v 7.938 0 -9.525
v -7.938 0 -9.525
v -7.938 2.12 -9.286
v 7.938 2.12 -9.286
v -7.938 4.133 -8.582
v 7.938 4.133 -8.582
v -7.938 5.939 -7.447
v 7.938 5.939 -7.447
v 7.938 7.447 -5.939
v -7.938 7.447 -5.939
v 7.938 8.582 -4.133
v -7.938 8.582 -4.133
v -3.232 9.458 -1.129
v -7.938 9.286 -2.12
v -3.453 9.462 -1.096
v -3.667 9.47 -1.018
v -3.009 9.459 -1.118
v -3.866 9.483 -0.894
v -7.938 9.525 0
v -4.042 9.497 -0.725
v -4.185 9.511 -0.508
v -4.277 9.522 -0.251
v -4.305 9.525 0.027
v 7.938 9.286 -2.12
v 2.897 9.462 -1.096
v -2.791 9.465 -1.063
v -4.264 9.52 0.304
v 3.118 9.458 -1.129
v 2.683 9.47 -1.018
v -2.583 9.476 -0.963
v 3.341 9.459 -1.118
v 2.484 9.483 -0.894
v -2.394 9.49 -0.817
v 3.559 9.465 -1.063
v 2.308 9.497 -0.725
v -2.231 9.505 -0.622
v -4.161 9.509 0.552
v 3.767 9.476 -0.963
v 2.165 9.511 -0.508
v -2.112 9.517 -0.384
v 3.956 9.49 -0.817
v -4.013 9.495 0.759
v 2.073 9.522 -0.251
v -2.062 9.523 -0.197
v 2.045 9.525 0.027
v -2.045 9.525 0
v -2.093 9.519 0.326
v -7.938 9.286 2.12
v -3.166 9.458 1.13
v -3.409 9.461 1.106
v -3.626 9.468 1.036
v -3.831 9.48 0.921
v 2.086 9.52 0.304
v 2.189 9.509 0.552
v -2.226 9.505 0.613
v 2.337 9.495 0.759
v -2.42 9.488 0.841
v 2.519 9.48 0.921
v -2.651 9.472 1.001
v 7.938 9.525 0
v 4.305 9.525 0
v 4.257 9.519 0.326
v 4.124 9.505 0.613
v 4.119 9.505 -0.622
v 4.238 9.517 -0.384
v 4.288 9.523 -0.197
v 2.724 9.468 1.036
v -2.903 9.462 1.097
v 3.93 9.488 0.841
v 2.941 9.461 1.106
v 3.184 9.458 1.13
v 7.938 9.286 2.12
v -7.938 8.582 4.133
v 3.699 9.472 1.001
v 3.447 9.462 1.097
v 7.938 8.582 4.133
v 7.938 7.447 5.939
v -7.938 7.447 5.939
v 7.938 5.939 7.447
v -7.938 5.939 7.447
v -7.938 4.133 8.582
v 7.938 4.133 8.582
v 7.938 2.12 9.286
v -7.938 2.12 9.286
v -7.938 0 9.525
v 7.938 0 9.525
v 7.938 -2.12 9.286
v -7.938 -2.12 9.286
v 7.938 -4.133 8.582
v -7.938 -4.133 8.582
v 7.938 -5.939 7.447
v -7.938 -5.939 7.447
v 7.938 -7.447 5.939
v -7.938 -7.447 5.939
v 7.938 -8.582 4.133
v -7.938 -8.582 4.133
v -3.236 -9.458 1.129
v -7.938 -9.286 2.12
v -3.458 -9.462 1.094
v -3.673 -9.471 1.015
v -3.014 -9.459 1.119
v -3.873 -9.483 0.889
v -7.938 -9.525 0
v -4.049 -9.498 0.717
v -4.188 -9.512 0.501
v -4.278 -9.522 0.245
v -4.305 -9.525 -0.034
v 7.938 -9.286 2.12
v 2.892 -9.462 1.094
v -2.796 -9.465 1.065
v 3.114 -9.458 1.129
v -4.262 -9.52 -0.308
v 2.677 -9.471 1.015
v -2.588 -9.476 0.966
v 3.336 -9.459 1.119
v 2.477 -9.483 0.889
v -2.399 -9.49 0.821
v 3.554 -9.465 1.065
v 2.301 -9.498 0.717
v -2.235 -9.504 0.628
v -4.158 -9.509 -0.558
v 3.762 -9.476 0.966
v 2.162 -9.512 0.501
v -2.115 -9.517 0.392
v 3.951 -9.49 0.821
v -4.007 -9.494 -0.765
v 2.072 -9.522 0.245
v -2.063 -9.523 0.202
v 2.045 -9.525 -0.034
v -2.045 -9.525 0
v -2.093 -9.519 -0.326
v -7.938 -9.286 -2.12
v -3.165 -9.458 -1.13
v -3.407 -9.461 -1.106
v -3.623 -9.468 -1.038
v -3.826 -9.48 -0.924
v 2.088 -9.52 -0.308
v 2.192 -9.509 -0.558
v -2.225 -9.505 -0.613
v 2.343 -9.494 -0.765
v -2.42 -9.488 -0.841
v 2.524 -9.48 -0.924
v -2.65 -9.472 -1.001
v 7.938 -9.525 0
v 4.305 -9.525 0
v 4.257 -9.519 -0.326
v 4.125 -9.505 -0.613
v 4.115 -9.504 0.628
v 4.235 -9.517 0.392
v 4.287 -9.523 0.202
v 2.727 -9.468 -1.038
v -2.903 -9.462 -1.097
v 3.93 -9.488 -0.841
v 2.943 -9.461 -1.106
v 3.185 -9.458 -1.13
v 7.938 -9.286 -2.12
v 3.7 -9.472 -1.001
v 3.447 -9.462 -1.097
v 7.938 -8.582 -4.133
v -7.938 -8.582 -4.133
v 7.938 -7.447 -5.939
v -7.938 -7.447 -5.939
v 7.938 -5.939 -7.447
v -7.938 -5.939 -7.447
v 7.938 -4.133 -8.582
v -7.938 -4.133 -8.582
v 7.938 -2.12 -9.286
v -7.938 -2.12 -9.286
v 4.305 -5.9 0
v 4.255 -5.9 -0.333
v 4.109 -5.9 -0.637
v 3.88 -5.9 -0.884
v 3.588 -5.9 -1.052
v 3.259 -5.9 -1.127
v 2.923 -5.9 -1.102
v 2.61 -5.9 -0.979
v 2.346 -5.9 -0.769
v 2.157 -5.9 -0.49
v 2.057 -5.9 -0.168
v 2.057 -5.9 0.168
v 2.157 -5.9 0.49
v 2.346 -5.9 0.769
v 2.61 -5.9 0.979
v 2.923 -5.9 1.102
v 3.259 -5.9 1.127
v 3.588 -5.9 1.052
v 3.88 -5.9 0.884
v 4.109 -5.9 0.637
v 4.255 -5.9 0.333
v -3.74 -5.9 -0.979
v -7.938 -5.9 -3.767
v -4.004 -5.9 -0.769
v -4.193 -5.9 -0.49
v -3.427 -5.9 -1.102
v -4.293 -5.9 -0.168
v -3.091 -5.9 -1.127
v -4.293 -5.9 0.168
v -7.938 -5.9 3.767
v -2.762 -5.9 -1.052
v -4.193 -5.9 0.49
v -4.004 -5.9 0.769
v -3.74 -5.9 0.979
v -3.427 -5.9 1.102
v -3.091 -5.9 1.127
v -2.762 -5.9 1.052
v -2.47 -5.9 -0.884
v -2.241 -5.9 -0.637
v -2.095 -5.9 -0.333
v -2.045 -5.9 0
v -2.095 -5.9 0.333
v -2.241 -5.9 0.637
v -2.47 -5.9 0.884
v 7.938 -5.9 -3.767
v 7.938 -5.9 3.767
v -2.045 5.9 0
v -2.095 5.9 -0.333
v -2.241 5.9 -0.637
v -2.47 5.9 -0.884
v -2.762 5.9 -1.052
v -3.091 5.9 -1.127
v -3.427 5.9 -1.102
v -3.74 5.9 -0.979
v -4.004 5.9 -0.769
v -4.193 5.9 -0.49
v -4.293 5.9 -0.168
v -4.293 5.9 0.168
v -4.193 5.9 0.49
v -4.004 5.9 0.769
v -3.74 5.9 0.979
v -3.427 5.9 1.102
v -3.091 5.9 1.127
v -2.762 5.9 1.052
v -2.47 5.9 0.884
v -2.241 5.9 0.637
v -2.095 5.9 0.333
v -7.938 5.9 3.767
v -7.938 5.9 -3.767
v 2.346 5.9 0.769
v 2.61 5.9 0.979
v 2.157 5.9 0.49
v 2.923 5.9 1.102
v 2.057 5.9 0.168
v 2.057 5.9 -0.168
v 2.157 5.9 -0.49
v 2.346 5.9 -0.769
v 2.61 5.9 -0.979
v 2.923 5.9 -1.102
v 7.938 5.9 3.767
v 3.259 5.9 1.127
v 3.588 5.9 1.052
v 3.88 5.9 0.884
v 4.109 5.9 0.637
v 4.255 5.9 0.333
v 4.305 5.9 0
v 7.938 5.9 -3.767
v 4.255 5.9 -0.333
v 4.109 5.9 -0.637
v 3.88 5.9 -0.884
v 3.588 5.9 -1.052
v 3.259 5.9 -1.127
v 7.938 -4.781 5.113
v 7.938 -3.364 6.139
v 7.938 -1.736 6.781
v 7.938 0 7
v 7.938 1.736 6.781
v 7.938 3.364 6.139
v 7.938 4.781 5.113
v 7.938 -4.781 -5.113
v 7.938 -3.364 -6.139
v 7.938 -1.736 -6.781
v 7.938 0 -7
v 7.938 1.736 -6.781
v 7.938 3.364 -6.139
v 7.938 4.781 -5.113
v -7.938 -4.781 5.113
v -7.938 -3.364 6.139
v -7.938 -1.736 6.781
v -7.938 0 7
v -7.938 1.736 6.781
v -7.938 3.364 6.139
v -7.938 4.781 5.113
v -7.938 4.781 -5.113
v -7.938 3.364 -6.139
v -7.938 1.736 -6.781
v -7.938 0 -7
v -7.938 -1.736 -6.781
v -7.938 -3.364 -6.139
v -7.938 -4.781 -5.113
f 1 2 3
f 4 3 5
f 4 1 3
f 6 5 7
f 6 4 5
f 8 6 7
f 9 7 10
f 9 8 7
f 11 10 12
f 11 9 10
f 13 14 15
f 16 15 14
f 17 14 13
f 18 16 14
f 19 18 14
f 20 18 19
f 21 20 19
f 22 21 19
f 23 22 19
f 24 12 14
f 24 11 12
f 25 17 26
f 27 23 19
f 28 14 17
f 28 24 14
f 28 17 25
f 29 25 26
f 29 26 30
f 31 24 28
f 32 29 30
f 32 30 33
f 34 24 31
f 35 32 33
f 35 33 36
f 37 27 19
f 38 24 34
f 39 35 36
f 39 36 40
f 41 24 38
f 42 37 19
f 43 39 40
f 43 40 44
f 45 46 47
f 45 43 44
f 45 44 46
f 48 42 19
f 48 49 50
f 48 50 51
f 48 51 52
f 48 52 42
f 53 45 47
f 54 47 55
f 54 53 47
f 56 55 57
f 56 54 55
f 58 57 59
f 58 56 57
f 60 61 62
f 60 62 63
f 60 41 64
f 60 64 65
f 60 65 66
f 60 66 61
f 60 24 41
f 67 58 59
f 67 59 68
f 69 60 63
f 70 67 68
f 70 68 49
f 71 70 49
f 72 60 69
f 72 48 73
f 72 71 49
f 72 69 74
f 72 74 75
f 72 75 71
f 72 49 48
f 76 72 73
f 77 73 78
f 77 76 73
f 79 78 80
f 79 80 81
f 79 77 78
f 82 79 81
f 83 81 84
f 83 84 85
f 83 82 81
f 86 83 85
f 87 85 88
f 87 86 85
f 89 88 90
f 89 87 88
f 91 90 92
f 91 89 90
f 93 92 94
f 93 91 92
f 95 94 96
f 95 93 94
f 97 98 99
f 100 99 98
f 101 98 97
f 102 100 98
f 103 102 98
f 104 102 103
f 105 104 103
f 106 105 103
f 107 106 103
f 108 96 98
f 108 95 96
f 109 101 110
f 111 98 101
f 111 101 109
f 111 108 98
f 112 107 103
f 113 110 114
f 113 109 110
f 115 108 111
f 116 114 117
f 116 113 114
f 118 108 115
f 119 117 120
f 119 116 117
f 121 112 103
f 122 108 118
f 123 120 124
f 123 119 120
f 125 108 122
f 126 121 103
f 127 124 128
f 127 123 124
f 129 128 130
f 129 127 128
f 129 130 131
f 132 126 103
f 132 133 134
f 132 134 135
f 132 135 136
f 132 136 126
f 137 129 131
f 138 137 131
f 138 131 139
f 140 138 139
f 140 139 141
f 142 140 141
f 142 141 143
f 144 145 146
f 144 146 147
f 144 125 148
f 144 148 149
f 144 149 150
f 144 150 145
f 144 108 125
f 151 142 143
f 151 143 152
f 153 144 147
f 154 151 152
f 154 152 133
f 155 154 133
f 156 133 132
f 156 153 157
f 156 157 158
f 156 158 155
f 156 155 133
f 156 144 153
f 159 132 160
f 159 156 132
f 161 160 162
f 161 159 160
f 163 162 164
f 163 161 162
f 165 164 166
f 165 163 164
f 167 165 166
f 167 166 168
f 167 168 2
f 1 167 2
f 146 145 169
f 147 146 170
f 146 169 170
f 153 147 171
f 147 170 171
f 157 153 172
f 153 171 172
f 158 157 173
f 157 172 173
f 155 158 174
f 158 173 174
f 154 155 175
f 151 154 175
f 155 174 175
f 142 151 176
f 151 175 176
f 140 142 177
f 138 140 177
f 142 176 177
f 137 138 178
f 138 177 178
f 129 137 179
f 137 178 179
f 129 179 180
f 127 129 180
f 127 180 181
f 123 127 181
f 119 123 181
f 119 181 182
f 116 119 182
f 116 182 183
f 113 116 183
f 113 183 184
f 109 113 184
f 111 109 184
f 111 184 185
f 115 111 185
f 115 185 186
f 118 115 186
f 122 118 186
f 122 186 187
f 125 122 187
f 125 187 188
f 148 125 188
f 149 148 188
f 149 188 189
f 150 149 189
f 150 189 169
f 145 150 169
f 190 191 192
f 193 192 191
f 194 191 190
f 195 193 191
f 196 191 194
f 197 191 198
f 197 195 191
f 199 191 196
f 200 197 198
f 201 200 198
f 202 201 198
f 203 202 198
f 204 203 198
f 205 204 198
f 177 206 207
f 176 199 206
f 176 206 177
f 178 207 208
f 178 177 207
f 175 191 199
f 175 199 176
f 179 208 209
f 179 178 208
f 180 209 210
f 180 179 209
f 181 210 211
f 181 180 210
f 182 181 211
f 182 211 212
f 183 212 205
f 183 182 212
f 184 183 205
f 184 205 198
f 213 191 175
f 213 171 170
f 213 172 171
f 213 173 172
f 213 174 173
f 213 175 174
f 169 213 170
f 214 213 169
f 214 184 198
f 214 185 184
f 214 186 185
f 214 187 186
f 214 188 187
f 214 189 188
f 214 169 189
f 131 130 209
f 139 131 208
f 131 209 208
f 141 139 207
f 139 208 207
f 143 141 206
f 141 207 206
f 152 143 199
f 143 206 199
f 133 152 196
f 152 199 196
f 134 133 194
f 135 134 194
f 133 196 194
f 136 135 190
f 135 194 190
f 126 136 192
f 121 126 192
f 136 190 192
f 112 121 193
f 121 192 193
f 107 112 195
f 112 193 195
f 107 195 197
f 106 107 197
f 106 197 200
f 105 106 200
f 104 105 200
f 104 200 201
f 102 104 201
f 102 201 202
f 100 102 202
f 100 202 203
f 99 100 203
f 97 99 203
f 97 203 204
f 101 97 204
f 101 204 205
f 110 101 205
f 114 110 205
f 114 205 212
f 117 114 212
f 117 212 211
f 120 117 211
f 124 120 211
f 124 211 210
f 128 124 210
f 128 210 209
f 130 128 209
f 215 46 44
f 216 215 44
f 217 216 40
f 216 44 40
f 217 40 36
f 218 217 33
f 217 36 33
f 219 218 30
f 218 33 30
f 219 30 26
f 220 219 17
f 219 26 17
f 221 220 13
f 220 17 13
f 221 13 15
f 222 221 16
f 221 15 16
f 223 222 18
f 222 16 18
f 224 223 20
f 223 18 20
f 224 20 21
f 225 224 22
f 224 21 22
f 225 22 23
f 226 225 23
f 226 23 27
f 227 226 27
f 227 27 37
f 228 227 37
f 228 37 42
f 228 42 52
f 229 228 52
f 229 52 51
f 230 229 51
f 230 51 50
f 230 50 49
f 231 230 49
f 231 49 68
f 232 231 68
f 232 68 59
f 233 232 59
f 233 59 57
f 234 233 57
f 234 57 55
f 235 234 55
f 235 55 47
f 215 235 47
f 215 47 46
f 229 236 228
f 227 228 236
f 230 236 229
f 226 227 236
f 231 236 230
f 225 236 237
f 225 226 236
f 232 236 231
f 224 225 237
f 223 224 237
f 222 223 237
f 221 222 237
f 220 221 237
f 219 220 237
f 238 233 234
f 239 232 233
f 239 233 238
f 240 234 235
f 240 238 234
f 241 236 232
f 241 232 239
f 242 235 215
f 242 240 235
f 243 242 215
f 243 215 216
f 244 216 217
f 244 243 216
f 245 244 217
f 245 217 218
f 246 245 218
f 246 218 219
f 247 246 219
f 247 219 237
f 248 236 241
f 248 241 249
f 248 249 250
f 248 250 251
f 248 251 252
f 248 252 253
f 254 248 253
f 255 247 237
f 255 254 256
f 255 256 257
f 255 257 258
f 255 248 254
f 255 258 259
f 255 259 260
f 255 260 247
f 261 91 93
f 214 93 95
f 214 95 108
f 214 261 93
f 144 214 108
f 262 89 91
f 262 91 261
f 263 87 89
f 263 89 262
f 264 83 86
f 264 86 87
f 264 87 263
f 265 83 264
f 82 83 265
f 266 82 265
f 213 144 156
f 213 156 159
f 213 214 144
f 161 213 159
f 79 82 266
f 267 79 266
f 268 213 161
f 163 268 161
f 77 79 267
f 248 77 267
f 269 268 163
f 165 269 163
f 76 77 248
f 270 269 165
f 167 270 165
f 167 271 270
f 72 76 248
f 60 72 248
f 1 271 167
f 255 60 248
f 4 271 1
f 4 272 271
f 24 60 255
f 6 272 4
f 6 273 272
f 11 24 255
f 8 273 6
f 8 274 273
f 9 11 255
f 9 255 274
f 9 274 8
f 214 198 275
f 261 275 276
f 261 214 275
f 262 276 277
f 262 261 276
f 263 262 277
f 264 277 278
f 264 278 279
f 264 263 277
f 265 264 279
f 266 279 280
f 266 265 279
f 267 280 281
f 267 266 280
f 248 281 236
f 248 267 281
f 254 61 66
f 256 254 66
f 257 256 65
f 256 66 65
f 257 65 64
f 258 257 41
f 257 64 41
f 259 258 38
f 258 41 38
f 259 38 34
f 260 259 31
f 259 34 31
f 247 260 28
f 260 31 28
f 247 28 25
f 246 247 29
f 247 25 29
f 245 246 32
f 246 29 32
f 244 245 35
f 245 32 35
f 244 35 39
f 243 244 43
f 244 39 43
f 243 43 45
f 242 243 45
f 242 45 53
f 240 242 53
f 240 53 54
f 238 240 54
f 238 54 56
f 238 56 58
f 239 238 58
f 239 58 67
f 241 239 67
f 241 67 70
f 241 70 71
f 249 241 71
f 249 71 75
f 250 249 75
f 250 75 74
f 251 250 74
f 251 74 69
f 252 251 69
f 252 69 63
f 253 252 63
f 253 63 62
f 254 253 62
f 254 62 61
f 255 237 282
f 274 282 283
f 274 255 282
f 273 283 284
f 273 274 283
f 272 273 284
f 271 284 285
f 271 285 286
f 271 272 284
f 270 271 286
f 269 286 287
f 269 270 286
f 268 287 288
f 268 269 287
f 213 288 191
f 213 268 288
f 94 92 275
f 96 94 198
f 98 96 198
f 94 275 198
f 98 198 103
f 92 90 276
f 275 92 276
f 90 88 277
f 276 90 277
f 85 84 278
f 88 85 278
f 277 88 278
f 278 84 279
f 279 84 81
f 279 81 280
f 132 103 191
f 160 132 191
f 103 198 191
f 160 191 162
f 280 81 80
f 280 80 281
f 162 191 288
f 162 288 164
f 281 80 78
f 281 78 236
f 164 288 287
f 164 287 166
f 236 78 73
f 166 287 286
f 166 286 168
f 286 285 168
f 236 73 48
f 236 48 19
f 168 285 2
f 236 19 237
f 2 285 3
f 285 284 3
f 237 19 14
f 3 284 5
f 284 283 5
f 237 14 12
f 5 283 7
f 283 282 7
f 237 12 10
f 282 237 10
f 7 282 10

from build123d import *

# Parameters (mm, degrees)
SKETCH1_R               = 9.525
BOSS_EXTRUDE1_DEPTH     = 7.9375
SKETCH2_R               = 1.1303
CUT_EXTRUDE1_DEPTH      = 1
CUT_EXTRUDE1_DEPTH_BACK = 20.05


with BuildPart() as part:
    # Sketch1 → Boss-Extrude1 (new body, symmetric)
    with BuildSketch(Plane(origin=(0, 0, 0), x_dir=(0, 0, -1), z_dir=(1, 0, 0))):
        Circle(SKETCH1_R)
        with BuildLine():
            Line((-3.76696164, 5.9), (3.76696164, 5.9))
            ThreePointArc((3.76696164, 5.9), (7, 0), (3.76696164, -5.9))
            Line((3.76696164, -5.9), (-3.76696164, -5.9))
            ThreePointArc((-3.76696164, -5.9), (-7, 0), (-3.76696164, 5.9))
        make_face(mode=Mode.SUBTRACT)
    extrude(amount=BOSS_EXTRUDE1_DEPTH, both=True)

    # Sketch2 → Cut-Extrude1 (cut, two sides)
    with BuildSketch(Plane(origin=(0, 9.525, 0), x_dir=(1, 0, 0), z_dir=(0, 1, 0))) as cut_extrude1_sk:
        with Locations((-3.175, 0)):
            Circle(SKETCH2_R)
        with Locations((3.175, 0)):
            Circle(SKETCH2_R)
    extrude(amount=CUT_EXTRUDE1_DEPTH, mode=Mode.SUBTRACT)
    extrude(cut_extrude1_sk.sketch, amount=-CUT_EXTRUDE1_DEPTH_BACK, mode=Mode.SUBTRACT)


solid = part.part
